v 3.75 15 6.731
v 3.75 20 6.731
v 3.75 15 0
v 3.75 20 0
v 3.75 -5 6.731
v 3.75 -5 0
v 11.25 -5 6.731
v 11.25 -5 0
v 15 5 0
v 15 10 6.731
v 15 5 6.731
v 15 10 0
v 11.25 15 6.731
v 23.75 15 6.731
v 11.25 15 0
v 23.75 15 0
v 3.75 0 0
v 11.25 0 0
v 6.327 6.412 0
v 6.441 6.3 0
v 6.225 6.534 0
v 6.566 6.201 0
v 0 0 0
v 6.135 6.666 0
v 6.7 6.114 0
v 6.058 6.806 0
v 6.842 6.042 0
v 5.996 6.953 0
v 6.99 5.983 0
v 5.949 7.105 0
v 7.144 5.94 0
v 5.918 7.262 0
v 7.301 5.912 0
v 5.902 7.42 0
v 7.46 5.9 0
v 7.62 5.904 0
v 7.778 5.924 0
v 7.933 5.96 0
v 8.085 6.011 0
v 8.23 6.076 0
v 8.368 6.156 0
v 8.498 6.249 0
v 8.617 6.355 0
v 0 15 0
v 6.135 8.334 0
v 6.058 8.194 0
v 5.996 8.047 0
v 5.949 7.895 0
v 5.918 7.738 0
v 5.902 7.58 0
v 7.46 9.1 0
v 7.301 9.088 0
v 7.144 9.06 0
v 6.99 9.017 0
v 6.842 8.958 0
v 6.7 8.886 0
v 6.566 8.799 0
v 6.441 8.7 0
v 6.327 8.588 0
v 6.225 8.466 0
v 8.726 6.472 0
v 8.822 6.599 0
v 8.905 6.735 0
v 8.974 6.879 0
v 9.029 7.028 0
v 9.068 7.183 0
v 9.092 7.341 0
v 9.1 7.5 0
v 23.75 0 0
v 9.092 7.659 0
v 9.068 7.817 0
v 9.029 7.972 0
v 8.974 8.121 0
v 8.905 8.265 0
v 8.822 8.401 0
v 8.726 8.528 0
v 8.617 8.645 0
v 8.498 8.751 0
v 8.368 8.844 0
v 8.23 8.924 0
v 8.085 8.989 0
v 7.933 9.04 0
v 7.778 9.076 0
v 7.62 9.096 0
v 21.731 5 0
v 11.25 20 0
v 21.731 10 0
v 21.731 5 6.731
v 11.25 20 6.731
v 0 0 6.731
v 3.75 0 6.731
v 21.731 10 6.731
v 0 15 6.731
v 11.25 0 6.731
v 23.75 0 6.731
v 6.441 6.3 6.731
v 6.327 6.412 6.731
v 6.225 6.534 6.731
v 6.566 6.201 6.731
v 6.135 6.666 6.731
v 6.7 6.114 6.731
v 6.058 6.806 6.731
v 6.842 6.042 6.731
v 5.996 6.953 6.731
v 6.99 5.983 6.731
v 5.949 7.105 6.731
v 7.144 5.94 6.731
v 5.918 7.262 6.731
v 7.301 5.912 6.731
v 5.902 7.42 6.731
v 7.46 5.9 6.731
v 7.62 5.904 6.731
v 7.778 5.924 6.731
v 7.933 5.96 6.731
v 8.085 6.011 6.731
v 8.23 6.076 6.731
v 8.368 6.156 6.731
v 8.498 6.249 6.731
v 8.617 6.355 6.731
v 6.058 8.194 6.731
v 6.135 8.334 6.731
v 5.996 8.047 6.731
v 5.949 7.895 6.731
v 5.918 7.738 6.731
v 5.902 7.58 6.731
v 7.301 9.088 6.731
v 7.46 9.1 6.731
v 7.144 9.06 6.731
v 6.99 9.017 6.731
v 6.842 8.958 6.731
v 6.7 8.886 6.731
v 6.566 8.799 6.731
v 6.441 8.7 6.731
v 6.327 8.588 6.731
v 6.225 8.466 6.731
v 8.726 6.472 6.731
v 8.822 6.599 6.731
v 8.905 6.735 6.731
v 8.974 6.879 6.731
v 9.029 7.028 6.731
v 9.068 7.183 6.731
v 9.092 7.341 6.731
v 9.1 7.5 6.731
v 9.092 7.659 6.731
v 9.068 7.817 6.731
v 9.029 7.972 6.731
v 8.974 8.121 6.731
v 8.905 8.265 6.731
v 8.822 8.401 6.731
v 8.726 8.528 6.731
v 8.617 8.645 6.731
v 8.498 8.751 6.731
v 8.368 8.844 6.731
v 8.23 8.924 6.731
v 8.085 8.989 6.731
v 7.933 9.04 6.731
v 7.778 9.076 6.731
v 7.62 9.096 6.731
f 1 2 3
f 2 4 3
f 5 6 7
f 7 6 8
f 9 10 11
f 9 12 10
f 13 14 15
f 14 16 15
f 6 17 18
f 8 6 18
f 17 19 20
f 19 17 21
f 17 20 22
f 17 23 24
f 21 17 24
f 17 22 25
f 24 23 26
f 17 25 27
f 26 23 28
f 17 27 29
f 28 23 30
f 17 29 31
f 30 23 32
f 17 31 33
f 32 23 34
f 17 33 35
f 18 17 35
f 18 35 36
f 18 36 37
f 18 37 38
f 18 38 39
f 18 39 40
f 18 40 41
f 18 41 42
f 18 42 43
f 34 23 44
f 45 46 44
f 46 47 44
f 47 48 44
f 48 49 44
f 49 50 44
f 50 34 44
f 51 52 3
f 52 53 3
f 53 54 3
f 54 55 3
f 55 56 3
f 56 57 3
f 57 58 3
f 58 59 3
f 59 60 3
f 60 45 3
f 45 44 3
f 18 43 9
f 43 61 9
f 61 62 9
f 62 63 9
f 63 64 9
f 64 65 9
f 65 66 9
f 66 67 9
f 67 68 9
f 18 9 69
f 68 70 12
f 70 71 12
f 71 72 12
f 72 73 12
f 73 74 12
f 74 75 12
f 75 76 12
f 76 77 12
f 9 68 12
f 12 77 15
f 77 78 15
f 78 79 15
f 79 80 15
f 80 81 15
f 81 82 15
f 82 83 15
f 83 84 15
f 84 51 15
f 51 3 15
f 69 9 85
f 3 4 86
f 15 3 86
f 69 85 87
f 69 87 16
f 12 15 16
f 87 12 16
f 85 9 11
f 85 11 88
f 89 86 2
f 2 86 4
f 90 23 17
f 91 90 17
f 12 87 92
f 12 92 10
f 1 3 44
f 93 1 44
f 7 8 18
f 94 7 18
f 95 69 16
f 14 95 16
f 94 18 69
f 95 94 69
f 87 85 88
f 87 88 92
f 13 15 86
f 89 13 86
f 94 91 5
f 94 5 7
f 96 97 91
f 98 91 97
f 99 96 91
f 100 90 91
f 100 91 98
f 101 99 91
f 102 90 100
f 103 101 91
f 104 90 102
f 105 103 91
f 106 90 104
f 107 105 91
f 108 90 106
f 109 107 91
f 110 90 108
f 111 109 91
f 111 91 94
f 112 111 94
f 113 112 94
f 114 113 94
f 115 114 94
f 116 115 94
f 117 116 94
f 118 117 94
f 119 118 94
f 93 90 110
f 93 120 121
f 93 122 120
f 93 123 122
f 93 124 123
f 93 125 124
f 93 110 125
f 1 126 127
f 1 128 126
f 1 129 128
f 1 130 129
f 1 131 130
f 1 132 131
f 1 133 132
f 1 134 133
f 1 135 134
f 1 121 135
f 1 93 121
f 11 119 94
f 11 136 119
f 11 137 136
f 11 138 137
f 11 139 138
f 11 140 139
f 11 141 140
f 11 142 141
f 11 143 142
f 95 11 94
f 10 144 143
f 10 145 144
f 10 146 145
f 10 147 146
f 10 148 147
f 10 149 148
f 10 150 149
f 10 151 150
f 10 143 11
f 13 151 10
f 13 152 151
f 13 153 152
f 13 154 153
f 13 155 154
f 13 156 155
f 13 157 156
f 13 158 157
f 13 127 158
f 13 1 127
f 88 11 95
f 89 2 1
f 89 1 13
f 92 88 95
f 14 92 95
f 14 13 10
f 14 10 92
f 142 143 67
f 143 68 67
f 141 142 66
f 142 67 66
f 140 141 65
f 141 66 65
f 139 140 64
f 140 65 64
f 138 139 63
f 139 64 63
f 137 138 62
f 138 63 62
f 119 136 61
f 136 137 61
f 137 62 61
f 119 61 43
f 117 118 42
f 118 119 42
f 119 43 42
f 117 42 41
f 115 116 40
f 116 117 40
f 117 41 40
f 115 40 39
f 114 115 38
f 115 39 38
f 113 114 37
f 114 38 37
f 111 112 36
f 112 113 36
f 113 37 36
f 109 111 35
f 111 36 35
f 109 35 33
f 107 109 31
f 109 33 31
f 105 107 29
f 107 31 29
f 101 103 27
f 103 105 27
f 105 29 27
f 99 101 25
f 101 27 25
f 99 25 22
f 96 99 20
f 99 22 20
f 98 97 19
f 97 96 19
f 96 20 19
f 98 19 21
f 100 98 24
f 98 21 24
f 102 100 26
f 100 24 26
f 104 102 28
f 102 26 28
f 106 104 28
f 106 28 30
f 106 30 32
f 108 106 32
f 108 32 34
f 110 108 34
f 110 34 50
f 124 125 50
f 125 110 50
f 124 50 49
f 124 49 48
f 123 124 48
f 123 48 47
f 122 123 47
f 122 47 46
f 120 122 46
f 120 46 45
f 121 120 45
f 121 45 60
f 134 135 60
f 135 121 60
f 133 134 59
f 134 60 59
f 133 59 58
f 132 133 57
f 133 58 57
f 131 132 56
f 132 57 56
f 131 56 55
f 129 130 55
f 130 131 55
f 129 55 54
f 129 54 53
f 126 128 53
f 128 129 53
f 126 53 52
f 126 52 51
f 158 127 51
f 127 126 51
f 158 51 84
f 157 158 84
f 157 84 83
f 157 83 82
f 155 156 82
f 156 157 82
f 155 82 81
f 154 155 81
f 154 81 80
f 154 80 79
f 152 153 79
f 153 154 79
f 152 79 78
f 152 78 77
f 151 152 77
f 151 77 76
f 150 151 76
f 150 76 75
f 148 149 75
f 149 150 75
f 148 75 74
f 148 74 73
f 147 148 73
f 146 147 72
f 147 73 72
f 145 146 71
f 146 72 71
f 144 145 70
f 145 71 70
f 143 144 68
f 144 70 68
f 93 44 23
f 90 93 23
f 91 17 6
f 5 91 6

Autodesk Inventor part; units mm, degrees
ref_plane "YZ Plane" through (0, 0, 0) normal (1, 0, 0) x (0, 1, 0)
ref_plane "XZ Plane" through (0, 0, 0) normal (0, 1, 0) x (-1, 0, 0)
ref_plane "XY Plane" through (0, 0, 0) normal (0, 0, 1) x (1, 0, 0)
sketch "Sketch1" plane through (0, 0, 0) normal (0, 0, 1) x (1, 0, 0)
  line L0 (0, 0) -> (3.75, 0)
  line L1 (3.75, 0) -> (3.75, -5)
  line L2 (3.75, -5) -> (11.25, -5)
  line L3 (11.25, -5) -> (11.25, 0)
  line L4 (11.25, 0) -> (23.75, 0)
  line L5 (23.75, 0) -> (23.75, 15)
  line L6 (23.75, 15) -> (11.25, 15)
  line L7 (11.25, 15) -> (11.25, 20)
  line L8 (11.25, 20) -> (3.75, 20)
  line L9 (3.75, 20) -> (3.75, 15)
  line L10 (3.75, 15) -> (0, 15)
  line L11 (0, 15) -> (0, 0)
  line L12 (21.731, 10) -> (15, 10)
  line L13 (15, 10) -> (15, 5)
  line L14 (15, 5) -> (21.731, 5)
  line L15 (21.731, 5) -> (21.731, 10)
  circle A0 centre (7.5, 7.5) radius 1.6
  point P0 (21.731, 7.5)
  point P1 (23.75, 7.5)
  point P2 (7.5, -5)
  point P3 (0, 7.5)
  dimension "d0" = 15
  dimension "d1" = 3.75
  dimension "d2" = 5
  dimension "d3" = 7.5
  dimension "d4" = 12.5
  dimension "d5" = 6.731
  dimension "d6" = 5
  dimension "d7" = 3.75
  dimension "d12" = 3.2
extrude "Extrusion1" add sketch "Sketch1" along normal blind 6.731
equation "\"d5\" = THICKB"
equation "\"d7\" = d1"
equation "\"d8\" = THICKB"
equation "\"THICKA\" = 3.175"
equation "\"THICKB\" = 6.731"
equation "\"THICKC\" = 12.7"
equation "\"MAGDIA\" = 9.5"
equation "\"BALLDIA\" = 12"
equation "\"THICKPLY\" = 5"
properties part number "Frame_Upper_Vertical_Plate_A"
